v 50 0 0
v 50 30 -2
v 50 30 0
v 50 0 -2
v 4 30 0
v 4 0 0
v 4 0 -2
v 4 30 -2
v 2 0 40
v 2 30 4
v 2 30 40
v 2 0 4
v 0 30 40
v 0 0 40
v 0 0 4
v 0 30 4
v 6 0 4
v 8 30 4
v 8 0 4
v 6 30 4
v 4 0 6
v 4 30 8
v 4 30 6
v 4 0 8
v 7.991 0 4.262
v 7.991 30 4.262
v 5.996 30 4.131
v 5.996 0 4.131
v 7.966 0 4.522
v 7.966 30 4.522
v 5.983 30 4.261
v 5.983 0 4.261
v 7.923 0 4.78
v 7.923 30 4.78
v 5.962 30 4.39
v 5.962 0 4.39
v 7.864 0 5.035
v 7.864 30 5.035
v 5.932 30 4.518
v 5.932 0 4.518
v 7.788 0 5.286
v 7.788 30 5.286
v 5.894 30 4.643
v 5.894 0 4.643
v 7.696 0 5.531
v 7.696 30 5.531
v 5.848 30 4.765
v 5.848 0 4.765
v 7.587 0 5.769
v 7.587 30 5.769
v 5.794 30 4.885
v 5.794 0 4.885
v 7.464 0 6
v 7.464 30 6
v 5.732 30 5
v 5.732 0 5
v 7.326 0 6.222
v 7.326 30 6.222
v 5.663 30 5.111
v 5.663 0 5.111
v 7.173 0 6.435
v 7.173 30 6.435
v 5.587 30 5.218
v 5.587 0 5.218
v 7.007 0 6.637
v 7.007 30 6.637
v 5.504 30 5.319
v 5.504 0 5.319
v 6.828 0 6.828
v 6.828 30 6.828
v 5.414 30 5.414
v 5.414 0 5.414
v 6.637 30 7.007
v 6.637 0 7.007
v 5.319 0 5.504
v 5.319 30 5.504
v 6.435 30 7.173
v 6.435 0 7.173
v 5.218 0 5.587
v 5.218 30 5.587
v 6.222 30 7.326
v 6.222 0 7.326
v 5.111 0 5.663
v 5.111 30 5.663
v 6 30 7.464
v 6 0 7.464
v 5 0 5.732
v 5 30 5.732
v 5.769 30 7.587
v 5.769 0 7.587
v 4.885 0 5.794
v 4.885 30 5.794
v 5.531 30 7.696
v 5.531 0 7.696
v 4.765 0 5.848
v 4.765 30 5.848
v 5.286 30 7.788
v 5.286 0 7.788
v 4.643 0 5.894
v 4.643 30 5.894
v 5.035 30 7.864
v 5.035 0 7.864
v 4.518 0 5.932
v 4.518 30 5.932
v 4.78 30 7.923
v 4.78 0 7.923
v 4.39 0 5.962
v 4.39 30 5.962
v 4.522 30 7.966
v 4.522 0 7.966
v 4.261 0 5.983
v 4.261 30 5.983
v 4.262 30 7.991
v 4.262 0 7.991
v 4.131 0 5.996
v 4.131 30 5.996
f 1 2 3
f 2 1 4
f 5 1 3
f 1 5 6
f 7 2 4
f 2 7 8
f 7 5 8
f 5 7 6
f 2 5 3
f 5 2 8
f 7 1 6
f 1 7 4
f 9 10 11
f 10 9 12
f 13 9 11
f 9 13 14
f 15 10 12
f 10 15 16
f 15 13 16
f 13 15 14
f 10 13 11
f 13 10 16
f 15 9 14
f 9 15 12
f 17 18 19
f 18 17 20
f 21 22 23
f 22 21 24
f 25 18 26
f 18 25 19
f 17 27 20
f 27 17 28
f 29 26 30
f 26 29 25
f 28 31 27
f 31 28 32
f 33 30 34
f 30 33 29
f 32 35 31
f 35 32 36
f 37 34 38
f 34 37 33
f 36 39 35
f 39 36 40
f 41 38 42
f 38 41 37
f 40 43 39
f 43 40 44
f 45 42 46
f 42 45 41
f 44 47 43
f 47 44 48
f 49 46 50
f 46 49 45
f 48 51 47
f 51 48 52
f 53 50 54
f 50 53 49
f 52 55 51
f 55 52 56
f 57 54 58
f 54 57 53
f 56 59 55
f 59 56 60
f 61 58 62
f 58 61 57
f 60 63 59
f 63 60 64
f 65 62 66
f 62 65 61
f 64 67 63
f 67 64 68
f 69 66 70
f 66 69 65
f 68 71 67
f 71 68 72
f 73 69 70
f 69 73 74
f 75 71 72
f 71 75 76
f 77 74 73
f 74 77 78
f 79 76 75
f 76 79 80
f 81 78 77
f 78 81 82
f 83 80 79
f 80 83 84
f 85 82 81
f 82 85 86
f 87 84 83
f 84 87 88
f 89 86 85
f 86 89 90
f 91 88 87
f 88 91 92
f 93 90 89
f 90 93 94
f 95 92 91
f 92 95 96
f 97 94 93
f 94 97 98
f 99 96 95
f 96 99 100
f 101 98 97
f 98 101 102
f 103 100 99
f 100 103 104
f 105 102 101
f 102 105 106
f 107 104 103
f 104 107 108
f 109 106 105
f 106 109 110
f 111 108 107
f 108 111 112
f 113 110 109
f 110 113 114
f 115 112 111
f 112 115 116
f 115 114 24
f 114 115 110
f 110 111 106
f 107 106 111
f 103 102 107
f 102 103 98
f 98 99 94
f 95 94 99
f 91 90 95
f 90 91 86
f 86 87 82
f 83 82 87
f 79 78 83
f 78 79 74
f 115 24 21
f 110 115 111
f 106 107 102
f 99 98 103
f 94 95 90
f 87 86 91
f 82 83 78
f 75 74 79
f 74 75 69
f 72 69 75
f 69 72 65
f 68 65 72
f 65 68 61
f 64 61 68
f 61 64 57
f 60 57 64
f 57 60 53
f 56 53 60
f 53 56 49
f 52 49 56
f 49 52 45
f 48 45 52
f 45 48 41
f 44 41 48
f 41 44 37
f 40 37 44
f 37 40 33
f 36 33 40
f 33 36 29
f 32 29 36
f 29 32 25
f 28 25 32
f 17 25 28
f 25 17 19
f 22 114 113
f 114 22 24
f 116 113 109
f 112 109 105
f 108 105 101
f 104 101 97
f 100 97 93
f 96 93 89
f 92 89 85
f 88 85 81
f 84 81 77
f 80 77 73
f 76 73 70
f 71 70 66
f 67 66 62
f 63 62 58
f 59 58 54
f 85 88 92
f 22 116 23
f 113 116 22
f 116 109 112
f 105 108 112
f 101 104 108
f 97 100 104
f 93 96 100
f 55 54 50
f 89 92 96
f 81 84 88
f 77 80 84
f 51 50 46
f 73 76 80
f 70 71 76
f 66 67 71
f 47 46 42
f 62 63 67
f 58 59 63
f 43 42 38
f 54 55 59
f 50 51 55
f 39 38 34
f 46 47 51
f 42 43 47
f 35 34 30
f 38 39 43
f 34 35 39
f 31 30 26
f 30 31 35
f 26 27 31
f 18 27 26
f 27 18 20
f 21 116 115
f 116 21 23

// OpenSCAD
$fn = 96;

thickness_mm = 2.0;
bend_radius_mm = 2.0;
k_factor = 0.45;
bend_angle_deg = 90;
flange_a_outside_mm = 50.0;
flange_b_outside_mm = 40.0;
width_mm = 30.0;

outside_radius_mm = bend_radius_mm + thickness_mm;
outside_setback_mm = (bend_radius_mm + thickness_mm) * tan(bend_angle_deg / 2);
straight_a_mm = flange_a_outside_mm - outside_setback_mm;
straight_b_mm = flange_b_outside_mm - outside_setback_mm;
bend_allowance_mm = (PI * bend_angle_deg / 180) * (bend_radius_mm + k_factor * thickness_mm);
developed_flat_length_mm = straight_a_mm + straight_b_mm + bend_allowance_mm;

echo(str(
    "MAKERBENCH-SHEETMETAL: {",
    "\"thickness_mm\":", thickness_mm, ",",
    "\"bend_radius_mm\":", bend_radius_mm, ",",
    "\"developed_flat_length_mm\":", developed_flat_length_mm,
    "}"
));

module annular_bend(width, ri, ro) {
    rotate_extrude(angle = 90, convexity = 10)
        translate([ri, -width / 2, 0])
            square([ro - ri, width], center = false);
}

module straight_leg_a(length, width, t, r) {
    translate([r + t, 0, -t])
        cube([length, width, t], center = false);
}

module straight_leg_b(length, width, t, r) {
    translate([0, 0, r + t])
        cube([t, width, length], center = false);
}

module formed_l_bracket() {
    union() {
        straight_leg_a(straight_a_mm, width_mm, thickness_mm, bend_radius_mm);
        straight_leg_b(straight_b_mm, width_mm, thickness_mm, bend_radius_mm);
        translate([bend_radius_mm + thickness_mm, width_mm / 2, bend_radius_mm + thickness_mm])
            rotate([90, 0, 0])
                annular_bend(width_mm, bend_radius_mm, outside_radius_mm);
    }
}

formed_l_bracket();
